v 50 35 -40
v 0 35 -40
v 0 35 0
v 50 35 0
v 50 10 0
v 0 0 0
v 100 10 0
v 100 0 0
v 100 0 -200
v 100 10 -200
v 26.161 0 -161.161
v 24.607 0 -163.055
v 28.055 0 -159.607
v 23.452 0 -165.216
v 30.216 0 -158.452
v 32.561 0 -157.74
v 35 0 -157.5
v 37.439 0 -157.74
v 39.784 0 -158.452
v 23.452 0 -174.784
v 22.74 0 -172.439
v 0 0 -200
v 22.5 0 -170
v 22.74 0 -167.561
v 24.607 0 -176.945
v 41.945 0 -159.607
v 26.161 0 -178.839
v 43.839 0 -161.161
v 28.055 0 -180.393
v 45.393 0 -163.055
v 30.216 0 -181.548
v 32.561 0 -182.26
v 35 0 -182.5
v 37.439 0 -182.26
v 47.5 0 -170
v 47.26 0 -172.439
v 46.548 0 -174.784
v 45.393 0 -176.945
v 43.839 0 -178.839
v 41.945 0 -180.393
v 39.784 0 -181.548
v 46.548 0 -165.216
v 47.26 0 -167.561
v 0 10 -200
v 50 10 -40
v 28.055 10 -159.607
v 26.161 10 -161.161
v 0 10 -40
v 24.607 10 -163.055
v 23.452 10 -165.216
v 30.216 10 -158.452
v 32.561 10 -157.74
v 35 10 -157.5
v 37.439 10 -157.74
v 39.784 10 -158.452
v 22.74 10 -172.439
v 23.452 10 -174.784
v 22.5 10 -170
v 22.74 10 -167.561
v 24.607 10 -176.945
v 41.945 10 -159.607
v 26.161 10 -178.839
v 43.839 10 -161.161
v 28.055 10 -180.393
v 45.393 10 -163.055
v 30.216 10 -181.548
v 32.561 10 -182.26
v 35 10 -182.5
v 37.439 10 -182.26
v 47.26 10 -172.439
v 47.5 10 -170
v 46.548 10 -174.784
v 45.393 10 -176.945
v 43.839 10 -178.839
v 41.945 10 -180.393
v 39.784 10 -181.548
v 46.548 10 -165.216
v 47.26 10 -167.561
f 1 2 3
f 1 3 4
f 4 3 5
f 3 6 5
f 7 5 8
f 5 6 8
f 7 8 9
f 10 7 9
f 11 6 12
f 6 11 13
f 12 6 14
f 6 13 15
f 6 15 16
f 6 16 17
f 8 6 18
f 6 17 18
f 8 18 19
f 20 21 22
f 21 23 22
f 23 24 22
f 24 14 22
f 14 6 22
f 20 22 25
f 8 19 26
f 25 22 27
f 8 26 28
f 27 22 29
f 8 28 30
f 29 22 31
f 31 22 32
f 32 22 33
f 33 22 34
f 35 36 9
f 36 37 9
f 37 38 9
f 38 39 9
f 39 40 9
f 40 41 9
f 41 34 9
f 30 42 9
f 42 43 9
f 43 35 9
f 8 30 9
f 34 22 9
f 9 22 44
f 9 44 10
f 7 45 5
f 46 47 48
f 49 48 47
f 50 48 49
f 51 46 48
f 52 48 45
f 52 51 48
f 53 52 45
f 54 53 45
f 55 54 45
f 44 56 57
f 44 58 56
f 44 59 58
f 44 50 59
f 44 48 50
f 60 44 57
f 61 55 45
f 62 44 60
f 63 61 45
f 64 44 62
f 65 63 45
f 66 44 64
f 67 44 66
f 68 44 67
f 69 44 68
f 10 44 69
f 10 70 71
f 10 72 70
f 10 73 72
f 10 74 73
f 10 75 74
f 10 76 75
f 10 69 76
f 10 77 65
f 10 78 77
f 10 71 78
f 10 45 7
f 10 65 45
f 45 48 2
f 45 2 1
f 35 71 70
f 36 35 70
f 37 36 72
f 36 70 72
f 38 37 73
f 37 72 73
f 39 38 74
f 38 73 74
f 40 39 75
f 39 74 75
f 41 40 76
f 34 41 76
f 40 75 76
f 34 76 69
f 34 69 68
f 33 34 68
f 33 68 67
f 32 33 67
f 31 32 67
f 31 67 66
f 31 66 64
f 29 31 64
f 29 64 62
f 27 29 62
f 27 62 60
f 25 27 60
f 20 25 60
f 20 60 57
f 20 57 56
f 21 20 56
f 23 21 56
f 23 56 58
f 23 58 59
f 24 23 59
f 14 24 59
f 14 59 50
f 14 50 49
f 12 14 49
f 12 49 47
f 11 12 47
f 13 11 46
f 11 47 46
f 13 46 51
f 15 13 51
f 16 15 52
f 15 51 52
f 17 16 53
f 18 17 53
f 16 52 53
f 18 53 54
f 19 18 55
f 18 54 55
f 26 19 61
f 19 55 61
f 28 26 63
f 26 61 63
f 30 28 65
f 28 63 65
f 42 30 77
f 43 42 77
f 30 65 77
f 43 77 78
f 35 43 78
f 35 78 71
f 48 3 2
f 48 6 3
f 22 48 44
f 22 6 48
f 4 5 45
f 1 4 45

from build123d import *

# Parameters (mm, degrees)
SKETCH1_W           = 100
SKETCH1_H           = 200
BOSS_EXTRUDE1_DEPTH = 10
SKETCH2_W           = 50
SKETCH2_H           = 40
BOSS_EXTRUDE2_DEPTH = 25
SKETCH4_R           = 12.5
CUT_EXTRUDE1_DEPTH  = 25


with BuildPart() as part:
    # Sketch1 → Boss-Extrude1 (new body)
    with BuildSketch(Plane(origin=(0, 0, 0), x_dir=(1, 0, 0), z_dir=(0, 1, 0))):
        with Locations((50, 100)):
            Rectangle(SKETCH1_W, SKETCH1_H)
    extrude(amount=BOSS_EXTRUDE1_DEPTH)

    # Sketch2 → Boss-Extrude2 (add)
    with BuildSketch(Plane(origin=(0, 10, 0), x_dir=(1, 0, 0), z_dir=(0, 1, 0))):
        with Locations((25, 20)):
            Rectangle(SKETCH2_W, SKETCH2_H)
    extrude(amount=BOSS_EXTRUDE2_DEPTH)

    # Sketch4 → Cut-Extrude1 (cut)
    with BuildSketch(Plane(origin=(0, 10, 0), x_dir=(1, 0, 0), z_dir=(0, 1, 0))):
        with Locations((35, 170)):
            Circle(SKETCH4_R)
    extrude(amount=-CUT_EXTRUDE1_DEPTH, mode=Mode.SUBTRACT)


solid = part.part
